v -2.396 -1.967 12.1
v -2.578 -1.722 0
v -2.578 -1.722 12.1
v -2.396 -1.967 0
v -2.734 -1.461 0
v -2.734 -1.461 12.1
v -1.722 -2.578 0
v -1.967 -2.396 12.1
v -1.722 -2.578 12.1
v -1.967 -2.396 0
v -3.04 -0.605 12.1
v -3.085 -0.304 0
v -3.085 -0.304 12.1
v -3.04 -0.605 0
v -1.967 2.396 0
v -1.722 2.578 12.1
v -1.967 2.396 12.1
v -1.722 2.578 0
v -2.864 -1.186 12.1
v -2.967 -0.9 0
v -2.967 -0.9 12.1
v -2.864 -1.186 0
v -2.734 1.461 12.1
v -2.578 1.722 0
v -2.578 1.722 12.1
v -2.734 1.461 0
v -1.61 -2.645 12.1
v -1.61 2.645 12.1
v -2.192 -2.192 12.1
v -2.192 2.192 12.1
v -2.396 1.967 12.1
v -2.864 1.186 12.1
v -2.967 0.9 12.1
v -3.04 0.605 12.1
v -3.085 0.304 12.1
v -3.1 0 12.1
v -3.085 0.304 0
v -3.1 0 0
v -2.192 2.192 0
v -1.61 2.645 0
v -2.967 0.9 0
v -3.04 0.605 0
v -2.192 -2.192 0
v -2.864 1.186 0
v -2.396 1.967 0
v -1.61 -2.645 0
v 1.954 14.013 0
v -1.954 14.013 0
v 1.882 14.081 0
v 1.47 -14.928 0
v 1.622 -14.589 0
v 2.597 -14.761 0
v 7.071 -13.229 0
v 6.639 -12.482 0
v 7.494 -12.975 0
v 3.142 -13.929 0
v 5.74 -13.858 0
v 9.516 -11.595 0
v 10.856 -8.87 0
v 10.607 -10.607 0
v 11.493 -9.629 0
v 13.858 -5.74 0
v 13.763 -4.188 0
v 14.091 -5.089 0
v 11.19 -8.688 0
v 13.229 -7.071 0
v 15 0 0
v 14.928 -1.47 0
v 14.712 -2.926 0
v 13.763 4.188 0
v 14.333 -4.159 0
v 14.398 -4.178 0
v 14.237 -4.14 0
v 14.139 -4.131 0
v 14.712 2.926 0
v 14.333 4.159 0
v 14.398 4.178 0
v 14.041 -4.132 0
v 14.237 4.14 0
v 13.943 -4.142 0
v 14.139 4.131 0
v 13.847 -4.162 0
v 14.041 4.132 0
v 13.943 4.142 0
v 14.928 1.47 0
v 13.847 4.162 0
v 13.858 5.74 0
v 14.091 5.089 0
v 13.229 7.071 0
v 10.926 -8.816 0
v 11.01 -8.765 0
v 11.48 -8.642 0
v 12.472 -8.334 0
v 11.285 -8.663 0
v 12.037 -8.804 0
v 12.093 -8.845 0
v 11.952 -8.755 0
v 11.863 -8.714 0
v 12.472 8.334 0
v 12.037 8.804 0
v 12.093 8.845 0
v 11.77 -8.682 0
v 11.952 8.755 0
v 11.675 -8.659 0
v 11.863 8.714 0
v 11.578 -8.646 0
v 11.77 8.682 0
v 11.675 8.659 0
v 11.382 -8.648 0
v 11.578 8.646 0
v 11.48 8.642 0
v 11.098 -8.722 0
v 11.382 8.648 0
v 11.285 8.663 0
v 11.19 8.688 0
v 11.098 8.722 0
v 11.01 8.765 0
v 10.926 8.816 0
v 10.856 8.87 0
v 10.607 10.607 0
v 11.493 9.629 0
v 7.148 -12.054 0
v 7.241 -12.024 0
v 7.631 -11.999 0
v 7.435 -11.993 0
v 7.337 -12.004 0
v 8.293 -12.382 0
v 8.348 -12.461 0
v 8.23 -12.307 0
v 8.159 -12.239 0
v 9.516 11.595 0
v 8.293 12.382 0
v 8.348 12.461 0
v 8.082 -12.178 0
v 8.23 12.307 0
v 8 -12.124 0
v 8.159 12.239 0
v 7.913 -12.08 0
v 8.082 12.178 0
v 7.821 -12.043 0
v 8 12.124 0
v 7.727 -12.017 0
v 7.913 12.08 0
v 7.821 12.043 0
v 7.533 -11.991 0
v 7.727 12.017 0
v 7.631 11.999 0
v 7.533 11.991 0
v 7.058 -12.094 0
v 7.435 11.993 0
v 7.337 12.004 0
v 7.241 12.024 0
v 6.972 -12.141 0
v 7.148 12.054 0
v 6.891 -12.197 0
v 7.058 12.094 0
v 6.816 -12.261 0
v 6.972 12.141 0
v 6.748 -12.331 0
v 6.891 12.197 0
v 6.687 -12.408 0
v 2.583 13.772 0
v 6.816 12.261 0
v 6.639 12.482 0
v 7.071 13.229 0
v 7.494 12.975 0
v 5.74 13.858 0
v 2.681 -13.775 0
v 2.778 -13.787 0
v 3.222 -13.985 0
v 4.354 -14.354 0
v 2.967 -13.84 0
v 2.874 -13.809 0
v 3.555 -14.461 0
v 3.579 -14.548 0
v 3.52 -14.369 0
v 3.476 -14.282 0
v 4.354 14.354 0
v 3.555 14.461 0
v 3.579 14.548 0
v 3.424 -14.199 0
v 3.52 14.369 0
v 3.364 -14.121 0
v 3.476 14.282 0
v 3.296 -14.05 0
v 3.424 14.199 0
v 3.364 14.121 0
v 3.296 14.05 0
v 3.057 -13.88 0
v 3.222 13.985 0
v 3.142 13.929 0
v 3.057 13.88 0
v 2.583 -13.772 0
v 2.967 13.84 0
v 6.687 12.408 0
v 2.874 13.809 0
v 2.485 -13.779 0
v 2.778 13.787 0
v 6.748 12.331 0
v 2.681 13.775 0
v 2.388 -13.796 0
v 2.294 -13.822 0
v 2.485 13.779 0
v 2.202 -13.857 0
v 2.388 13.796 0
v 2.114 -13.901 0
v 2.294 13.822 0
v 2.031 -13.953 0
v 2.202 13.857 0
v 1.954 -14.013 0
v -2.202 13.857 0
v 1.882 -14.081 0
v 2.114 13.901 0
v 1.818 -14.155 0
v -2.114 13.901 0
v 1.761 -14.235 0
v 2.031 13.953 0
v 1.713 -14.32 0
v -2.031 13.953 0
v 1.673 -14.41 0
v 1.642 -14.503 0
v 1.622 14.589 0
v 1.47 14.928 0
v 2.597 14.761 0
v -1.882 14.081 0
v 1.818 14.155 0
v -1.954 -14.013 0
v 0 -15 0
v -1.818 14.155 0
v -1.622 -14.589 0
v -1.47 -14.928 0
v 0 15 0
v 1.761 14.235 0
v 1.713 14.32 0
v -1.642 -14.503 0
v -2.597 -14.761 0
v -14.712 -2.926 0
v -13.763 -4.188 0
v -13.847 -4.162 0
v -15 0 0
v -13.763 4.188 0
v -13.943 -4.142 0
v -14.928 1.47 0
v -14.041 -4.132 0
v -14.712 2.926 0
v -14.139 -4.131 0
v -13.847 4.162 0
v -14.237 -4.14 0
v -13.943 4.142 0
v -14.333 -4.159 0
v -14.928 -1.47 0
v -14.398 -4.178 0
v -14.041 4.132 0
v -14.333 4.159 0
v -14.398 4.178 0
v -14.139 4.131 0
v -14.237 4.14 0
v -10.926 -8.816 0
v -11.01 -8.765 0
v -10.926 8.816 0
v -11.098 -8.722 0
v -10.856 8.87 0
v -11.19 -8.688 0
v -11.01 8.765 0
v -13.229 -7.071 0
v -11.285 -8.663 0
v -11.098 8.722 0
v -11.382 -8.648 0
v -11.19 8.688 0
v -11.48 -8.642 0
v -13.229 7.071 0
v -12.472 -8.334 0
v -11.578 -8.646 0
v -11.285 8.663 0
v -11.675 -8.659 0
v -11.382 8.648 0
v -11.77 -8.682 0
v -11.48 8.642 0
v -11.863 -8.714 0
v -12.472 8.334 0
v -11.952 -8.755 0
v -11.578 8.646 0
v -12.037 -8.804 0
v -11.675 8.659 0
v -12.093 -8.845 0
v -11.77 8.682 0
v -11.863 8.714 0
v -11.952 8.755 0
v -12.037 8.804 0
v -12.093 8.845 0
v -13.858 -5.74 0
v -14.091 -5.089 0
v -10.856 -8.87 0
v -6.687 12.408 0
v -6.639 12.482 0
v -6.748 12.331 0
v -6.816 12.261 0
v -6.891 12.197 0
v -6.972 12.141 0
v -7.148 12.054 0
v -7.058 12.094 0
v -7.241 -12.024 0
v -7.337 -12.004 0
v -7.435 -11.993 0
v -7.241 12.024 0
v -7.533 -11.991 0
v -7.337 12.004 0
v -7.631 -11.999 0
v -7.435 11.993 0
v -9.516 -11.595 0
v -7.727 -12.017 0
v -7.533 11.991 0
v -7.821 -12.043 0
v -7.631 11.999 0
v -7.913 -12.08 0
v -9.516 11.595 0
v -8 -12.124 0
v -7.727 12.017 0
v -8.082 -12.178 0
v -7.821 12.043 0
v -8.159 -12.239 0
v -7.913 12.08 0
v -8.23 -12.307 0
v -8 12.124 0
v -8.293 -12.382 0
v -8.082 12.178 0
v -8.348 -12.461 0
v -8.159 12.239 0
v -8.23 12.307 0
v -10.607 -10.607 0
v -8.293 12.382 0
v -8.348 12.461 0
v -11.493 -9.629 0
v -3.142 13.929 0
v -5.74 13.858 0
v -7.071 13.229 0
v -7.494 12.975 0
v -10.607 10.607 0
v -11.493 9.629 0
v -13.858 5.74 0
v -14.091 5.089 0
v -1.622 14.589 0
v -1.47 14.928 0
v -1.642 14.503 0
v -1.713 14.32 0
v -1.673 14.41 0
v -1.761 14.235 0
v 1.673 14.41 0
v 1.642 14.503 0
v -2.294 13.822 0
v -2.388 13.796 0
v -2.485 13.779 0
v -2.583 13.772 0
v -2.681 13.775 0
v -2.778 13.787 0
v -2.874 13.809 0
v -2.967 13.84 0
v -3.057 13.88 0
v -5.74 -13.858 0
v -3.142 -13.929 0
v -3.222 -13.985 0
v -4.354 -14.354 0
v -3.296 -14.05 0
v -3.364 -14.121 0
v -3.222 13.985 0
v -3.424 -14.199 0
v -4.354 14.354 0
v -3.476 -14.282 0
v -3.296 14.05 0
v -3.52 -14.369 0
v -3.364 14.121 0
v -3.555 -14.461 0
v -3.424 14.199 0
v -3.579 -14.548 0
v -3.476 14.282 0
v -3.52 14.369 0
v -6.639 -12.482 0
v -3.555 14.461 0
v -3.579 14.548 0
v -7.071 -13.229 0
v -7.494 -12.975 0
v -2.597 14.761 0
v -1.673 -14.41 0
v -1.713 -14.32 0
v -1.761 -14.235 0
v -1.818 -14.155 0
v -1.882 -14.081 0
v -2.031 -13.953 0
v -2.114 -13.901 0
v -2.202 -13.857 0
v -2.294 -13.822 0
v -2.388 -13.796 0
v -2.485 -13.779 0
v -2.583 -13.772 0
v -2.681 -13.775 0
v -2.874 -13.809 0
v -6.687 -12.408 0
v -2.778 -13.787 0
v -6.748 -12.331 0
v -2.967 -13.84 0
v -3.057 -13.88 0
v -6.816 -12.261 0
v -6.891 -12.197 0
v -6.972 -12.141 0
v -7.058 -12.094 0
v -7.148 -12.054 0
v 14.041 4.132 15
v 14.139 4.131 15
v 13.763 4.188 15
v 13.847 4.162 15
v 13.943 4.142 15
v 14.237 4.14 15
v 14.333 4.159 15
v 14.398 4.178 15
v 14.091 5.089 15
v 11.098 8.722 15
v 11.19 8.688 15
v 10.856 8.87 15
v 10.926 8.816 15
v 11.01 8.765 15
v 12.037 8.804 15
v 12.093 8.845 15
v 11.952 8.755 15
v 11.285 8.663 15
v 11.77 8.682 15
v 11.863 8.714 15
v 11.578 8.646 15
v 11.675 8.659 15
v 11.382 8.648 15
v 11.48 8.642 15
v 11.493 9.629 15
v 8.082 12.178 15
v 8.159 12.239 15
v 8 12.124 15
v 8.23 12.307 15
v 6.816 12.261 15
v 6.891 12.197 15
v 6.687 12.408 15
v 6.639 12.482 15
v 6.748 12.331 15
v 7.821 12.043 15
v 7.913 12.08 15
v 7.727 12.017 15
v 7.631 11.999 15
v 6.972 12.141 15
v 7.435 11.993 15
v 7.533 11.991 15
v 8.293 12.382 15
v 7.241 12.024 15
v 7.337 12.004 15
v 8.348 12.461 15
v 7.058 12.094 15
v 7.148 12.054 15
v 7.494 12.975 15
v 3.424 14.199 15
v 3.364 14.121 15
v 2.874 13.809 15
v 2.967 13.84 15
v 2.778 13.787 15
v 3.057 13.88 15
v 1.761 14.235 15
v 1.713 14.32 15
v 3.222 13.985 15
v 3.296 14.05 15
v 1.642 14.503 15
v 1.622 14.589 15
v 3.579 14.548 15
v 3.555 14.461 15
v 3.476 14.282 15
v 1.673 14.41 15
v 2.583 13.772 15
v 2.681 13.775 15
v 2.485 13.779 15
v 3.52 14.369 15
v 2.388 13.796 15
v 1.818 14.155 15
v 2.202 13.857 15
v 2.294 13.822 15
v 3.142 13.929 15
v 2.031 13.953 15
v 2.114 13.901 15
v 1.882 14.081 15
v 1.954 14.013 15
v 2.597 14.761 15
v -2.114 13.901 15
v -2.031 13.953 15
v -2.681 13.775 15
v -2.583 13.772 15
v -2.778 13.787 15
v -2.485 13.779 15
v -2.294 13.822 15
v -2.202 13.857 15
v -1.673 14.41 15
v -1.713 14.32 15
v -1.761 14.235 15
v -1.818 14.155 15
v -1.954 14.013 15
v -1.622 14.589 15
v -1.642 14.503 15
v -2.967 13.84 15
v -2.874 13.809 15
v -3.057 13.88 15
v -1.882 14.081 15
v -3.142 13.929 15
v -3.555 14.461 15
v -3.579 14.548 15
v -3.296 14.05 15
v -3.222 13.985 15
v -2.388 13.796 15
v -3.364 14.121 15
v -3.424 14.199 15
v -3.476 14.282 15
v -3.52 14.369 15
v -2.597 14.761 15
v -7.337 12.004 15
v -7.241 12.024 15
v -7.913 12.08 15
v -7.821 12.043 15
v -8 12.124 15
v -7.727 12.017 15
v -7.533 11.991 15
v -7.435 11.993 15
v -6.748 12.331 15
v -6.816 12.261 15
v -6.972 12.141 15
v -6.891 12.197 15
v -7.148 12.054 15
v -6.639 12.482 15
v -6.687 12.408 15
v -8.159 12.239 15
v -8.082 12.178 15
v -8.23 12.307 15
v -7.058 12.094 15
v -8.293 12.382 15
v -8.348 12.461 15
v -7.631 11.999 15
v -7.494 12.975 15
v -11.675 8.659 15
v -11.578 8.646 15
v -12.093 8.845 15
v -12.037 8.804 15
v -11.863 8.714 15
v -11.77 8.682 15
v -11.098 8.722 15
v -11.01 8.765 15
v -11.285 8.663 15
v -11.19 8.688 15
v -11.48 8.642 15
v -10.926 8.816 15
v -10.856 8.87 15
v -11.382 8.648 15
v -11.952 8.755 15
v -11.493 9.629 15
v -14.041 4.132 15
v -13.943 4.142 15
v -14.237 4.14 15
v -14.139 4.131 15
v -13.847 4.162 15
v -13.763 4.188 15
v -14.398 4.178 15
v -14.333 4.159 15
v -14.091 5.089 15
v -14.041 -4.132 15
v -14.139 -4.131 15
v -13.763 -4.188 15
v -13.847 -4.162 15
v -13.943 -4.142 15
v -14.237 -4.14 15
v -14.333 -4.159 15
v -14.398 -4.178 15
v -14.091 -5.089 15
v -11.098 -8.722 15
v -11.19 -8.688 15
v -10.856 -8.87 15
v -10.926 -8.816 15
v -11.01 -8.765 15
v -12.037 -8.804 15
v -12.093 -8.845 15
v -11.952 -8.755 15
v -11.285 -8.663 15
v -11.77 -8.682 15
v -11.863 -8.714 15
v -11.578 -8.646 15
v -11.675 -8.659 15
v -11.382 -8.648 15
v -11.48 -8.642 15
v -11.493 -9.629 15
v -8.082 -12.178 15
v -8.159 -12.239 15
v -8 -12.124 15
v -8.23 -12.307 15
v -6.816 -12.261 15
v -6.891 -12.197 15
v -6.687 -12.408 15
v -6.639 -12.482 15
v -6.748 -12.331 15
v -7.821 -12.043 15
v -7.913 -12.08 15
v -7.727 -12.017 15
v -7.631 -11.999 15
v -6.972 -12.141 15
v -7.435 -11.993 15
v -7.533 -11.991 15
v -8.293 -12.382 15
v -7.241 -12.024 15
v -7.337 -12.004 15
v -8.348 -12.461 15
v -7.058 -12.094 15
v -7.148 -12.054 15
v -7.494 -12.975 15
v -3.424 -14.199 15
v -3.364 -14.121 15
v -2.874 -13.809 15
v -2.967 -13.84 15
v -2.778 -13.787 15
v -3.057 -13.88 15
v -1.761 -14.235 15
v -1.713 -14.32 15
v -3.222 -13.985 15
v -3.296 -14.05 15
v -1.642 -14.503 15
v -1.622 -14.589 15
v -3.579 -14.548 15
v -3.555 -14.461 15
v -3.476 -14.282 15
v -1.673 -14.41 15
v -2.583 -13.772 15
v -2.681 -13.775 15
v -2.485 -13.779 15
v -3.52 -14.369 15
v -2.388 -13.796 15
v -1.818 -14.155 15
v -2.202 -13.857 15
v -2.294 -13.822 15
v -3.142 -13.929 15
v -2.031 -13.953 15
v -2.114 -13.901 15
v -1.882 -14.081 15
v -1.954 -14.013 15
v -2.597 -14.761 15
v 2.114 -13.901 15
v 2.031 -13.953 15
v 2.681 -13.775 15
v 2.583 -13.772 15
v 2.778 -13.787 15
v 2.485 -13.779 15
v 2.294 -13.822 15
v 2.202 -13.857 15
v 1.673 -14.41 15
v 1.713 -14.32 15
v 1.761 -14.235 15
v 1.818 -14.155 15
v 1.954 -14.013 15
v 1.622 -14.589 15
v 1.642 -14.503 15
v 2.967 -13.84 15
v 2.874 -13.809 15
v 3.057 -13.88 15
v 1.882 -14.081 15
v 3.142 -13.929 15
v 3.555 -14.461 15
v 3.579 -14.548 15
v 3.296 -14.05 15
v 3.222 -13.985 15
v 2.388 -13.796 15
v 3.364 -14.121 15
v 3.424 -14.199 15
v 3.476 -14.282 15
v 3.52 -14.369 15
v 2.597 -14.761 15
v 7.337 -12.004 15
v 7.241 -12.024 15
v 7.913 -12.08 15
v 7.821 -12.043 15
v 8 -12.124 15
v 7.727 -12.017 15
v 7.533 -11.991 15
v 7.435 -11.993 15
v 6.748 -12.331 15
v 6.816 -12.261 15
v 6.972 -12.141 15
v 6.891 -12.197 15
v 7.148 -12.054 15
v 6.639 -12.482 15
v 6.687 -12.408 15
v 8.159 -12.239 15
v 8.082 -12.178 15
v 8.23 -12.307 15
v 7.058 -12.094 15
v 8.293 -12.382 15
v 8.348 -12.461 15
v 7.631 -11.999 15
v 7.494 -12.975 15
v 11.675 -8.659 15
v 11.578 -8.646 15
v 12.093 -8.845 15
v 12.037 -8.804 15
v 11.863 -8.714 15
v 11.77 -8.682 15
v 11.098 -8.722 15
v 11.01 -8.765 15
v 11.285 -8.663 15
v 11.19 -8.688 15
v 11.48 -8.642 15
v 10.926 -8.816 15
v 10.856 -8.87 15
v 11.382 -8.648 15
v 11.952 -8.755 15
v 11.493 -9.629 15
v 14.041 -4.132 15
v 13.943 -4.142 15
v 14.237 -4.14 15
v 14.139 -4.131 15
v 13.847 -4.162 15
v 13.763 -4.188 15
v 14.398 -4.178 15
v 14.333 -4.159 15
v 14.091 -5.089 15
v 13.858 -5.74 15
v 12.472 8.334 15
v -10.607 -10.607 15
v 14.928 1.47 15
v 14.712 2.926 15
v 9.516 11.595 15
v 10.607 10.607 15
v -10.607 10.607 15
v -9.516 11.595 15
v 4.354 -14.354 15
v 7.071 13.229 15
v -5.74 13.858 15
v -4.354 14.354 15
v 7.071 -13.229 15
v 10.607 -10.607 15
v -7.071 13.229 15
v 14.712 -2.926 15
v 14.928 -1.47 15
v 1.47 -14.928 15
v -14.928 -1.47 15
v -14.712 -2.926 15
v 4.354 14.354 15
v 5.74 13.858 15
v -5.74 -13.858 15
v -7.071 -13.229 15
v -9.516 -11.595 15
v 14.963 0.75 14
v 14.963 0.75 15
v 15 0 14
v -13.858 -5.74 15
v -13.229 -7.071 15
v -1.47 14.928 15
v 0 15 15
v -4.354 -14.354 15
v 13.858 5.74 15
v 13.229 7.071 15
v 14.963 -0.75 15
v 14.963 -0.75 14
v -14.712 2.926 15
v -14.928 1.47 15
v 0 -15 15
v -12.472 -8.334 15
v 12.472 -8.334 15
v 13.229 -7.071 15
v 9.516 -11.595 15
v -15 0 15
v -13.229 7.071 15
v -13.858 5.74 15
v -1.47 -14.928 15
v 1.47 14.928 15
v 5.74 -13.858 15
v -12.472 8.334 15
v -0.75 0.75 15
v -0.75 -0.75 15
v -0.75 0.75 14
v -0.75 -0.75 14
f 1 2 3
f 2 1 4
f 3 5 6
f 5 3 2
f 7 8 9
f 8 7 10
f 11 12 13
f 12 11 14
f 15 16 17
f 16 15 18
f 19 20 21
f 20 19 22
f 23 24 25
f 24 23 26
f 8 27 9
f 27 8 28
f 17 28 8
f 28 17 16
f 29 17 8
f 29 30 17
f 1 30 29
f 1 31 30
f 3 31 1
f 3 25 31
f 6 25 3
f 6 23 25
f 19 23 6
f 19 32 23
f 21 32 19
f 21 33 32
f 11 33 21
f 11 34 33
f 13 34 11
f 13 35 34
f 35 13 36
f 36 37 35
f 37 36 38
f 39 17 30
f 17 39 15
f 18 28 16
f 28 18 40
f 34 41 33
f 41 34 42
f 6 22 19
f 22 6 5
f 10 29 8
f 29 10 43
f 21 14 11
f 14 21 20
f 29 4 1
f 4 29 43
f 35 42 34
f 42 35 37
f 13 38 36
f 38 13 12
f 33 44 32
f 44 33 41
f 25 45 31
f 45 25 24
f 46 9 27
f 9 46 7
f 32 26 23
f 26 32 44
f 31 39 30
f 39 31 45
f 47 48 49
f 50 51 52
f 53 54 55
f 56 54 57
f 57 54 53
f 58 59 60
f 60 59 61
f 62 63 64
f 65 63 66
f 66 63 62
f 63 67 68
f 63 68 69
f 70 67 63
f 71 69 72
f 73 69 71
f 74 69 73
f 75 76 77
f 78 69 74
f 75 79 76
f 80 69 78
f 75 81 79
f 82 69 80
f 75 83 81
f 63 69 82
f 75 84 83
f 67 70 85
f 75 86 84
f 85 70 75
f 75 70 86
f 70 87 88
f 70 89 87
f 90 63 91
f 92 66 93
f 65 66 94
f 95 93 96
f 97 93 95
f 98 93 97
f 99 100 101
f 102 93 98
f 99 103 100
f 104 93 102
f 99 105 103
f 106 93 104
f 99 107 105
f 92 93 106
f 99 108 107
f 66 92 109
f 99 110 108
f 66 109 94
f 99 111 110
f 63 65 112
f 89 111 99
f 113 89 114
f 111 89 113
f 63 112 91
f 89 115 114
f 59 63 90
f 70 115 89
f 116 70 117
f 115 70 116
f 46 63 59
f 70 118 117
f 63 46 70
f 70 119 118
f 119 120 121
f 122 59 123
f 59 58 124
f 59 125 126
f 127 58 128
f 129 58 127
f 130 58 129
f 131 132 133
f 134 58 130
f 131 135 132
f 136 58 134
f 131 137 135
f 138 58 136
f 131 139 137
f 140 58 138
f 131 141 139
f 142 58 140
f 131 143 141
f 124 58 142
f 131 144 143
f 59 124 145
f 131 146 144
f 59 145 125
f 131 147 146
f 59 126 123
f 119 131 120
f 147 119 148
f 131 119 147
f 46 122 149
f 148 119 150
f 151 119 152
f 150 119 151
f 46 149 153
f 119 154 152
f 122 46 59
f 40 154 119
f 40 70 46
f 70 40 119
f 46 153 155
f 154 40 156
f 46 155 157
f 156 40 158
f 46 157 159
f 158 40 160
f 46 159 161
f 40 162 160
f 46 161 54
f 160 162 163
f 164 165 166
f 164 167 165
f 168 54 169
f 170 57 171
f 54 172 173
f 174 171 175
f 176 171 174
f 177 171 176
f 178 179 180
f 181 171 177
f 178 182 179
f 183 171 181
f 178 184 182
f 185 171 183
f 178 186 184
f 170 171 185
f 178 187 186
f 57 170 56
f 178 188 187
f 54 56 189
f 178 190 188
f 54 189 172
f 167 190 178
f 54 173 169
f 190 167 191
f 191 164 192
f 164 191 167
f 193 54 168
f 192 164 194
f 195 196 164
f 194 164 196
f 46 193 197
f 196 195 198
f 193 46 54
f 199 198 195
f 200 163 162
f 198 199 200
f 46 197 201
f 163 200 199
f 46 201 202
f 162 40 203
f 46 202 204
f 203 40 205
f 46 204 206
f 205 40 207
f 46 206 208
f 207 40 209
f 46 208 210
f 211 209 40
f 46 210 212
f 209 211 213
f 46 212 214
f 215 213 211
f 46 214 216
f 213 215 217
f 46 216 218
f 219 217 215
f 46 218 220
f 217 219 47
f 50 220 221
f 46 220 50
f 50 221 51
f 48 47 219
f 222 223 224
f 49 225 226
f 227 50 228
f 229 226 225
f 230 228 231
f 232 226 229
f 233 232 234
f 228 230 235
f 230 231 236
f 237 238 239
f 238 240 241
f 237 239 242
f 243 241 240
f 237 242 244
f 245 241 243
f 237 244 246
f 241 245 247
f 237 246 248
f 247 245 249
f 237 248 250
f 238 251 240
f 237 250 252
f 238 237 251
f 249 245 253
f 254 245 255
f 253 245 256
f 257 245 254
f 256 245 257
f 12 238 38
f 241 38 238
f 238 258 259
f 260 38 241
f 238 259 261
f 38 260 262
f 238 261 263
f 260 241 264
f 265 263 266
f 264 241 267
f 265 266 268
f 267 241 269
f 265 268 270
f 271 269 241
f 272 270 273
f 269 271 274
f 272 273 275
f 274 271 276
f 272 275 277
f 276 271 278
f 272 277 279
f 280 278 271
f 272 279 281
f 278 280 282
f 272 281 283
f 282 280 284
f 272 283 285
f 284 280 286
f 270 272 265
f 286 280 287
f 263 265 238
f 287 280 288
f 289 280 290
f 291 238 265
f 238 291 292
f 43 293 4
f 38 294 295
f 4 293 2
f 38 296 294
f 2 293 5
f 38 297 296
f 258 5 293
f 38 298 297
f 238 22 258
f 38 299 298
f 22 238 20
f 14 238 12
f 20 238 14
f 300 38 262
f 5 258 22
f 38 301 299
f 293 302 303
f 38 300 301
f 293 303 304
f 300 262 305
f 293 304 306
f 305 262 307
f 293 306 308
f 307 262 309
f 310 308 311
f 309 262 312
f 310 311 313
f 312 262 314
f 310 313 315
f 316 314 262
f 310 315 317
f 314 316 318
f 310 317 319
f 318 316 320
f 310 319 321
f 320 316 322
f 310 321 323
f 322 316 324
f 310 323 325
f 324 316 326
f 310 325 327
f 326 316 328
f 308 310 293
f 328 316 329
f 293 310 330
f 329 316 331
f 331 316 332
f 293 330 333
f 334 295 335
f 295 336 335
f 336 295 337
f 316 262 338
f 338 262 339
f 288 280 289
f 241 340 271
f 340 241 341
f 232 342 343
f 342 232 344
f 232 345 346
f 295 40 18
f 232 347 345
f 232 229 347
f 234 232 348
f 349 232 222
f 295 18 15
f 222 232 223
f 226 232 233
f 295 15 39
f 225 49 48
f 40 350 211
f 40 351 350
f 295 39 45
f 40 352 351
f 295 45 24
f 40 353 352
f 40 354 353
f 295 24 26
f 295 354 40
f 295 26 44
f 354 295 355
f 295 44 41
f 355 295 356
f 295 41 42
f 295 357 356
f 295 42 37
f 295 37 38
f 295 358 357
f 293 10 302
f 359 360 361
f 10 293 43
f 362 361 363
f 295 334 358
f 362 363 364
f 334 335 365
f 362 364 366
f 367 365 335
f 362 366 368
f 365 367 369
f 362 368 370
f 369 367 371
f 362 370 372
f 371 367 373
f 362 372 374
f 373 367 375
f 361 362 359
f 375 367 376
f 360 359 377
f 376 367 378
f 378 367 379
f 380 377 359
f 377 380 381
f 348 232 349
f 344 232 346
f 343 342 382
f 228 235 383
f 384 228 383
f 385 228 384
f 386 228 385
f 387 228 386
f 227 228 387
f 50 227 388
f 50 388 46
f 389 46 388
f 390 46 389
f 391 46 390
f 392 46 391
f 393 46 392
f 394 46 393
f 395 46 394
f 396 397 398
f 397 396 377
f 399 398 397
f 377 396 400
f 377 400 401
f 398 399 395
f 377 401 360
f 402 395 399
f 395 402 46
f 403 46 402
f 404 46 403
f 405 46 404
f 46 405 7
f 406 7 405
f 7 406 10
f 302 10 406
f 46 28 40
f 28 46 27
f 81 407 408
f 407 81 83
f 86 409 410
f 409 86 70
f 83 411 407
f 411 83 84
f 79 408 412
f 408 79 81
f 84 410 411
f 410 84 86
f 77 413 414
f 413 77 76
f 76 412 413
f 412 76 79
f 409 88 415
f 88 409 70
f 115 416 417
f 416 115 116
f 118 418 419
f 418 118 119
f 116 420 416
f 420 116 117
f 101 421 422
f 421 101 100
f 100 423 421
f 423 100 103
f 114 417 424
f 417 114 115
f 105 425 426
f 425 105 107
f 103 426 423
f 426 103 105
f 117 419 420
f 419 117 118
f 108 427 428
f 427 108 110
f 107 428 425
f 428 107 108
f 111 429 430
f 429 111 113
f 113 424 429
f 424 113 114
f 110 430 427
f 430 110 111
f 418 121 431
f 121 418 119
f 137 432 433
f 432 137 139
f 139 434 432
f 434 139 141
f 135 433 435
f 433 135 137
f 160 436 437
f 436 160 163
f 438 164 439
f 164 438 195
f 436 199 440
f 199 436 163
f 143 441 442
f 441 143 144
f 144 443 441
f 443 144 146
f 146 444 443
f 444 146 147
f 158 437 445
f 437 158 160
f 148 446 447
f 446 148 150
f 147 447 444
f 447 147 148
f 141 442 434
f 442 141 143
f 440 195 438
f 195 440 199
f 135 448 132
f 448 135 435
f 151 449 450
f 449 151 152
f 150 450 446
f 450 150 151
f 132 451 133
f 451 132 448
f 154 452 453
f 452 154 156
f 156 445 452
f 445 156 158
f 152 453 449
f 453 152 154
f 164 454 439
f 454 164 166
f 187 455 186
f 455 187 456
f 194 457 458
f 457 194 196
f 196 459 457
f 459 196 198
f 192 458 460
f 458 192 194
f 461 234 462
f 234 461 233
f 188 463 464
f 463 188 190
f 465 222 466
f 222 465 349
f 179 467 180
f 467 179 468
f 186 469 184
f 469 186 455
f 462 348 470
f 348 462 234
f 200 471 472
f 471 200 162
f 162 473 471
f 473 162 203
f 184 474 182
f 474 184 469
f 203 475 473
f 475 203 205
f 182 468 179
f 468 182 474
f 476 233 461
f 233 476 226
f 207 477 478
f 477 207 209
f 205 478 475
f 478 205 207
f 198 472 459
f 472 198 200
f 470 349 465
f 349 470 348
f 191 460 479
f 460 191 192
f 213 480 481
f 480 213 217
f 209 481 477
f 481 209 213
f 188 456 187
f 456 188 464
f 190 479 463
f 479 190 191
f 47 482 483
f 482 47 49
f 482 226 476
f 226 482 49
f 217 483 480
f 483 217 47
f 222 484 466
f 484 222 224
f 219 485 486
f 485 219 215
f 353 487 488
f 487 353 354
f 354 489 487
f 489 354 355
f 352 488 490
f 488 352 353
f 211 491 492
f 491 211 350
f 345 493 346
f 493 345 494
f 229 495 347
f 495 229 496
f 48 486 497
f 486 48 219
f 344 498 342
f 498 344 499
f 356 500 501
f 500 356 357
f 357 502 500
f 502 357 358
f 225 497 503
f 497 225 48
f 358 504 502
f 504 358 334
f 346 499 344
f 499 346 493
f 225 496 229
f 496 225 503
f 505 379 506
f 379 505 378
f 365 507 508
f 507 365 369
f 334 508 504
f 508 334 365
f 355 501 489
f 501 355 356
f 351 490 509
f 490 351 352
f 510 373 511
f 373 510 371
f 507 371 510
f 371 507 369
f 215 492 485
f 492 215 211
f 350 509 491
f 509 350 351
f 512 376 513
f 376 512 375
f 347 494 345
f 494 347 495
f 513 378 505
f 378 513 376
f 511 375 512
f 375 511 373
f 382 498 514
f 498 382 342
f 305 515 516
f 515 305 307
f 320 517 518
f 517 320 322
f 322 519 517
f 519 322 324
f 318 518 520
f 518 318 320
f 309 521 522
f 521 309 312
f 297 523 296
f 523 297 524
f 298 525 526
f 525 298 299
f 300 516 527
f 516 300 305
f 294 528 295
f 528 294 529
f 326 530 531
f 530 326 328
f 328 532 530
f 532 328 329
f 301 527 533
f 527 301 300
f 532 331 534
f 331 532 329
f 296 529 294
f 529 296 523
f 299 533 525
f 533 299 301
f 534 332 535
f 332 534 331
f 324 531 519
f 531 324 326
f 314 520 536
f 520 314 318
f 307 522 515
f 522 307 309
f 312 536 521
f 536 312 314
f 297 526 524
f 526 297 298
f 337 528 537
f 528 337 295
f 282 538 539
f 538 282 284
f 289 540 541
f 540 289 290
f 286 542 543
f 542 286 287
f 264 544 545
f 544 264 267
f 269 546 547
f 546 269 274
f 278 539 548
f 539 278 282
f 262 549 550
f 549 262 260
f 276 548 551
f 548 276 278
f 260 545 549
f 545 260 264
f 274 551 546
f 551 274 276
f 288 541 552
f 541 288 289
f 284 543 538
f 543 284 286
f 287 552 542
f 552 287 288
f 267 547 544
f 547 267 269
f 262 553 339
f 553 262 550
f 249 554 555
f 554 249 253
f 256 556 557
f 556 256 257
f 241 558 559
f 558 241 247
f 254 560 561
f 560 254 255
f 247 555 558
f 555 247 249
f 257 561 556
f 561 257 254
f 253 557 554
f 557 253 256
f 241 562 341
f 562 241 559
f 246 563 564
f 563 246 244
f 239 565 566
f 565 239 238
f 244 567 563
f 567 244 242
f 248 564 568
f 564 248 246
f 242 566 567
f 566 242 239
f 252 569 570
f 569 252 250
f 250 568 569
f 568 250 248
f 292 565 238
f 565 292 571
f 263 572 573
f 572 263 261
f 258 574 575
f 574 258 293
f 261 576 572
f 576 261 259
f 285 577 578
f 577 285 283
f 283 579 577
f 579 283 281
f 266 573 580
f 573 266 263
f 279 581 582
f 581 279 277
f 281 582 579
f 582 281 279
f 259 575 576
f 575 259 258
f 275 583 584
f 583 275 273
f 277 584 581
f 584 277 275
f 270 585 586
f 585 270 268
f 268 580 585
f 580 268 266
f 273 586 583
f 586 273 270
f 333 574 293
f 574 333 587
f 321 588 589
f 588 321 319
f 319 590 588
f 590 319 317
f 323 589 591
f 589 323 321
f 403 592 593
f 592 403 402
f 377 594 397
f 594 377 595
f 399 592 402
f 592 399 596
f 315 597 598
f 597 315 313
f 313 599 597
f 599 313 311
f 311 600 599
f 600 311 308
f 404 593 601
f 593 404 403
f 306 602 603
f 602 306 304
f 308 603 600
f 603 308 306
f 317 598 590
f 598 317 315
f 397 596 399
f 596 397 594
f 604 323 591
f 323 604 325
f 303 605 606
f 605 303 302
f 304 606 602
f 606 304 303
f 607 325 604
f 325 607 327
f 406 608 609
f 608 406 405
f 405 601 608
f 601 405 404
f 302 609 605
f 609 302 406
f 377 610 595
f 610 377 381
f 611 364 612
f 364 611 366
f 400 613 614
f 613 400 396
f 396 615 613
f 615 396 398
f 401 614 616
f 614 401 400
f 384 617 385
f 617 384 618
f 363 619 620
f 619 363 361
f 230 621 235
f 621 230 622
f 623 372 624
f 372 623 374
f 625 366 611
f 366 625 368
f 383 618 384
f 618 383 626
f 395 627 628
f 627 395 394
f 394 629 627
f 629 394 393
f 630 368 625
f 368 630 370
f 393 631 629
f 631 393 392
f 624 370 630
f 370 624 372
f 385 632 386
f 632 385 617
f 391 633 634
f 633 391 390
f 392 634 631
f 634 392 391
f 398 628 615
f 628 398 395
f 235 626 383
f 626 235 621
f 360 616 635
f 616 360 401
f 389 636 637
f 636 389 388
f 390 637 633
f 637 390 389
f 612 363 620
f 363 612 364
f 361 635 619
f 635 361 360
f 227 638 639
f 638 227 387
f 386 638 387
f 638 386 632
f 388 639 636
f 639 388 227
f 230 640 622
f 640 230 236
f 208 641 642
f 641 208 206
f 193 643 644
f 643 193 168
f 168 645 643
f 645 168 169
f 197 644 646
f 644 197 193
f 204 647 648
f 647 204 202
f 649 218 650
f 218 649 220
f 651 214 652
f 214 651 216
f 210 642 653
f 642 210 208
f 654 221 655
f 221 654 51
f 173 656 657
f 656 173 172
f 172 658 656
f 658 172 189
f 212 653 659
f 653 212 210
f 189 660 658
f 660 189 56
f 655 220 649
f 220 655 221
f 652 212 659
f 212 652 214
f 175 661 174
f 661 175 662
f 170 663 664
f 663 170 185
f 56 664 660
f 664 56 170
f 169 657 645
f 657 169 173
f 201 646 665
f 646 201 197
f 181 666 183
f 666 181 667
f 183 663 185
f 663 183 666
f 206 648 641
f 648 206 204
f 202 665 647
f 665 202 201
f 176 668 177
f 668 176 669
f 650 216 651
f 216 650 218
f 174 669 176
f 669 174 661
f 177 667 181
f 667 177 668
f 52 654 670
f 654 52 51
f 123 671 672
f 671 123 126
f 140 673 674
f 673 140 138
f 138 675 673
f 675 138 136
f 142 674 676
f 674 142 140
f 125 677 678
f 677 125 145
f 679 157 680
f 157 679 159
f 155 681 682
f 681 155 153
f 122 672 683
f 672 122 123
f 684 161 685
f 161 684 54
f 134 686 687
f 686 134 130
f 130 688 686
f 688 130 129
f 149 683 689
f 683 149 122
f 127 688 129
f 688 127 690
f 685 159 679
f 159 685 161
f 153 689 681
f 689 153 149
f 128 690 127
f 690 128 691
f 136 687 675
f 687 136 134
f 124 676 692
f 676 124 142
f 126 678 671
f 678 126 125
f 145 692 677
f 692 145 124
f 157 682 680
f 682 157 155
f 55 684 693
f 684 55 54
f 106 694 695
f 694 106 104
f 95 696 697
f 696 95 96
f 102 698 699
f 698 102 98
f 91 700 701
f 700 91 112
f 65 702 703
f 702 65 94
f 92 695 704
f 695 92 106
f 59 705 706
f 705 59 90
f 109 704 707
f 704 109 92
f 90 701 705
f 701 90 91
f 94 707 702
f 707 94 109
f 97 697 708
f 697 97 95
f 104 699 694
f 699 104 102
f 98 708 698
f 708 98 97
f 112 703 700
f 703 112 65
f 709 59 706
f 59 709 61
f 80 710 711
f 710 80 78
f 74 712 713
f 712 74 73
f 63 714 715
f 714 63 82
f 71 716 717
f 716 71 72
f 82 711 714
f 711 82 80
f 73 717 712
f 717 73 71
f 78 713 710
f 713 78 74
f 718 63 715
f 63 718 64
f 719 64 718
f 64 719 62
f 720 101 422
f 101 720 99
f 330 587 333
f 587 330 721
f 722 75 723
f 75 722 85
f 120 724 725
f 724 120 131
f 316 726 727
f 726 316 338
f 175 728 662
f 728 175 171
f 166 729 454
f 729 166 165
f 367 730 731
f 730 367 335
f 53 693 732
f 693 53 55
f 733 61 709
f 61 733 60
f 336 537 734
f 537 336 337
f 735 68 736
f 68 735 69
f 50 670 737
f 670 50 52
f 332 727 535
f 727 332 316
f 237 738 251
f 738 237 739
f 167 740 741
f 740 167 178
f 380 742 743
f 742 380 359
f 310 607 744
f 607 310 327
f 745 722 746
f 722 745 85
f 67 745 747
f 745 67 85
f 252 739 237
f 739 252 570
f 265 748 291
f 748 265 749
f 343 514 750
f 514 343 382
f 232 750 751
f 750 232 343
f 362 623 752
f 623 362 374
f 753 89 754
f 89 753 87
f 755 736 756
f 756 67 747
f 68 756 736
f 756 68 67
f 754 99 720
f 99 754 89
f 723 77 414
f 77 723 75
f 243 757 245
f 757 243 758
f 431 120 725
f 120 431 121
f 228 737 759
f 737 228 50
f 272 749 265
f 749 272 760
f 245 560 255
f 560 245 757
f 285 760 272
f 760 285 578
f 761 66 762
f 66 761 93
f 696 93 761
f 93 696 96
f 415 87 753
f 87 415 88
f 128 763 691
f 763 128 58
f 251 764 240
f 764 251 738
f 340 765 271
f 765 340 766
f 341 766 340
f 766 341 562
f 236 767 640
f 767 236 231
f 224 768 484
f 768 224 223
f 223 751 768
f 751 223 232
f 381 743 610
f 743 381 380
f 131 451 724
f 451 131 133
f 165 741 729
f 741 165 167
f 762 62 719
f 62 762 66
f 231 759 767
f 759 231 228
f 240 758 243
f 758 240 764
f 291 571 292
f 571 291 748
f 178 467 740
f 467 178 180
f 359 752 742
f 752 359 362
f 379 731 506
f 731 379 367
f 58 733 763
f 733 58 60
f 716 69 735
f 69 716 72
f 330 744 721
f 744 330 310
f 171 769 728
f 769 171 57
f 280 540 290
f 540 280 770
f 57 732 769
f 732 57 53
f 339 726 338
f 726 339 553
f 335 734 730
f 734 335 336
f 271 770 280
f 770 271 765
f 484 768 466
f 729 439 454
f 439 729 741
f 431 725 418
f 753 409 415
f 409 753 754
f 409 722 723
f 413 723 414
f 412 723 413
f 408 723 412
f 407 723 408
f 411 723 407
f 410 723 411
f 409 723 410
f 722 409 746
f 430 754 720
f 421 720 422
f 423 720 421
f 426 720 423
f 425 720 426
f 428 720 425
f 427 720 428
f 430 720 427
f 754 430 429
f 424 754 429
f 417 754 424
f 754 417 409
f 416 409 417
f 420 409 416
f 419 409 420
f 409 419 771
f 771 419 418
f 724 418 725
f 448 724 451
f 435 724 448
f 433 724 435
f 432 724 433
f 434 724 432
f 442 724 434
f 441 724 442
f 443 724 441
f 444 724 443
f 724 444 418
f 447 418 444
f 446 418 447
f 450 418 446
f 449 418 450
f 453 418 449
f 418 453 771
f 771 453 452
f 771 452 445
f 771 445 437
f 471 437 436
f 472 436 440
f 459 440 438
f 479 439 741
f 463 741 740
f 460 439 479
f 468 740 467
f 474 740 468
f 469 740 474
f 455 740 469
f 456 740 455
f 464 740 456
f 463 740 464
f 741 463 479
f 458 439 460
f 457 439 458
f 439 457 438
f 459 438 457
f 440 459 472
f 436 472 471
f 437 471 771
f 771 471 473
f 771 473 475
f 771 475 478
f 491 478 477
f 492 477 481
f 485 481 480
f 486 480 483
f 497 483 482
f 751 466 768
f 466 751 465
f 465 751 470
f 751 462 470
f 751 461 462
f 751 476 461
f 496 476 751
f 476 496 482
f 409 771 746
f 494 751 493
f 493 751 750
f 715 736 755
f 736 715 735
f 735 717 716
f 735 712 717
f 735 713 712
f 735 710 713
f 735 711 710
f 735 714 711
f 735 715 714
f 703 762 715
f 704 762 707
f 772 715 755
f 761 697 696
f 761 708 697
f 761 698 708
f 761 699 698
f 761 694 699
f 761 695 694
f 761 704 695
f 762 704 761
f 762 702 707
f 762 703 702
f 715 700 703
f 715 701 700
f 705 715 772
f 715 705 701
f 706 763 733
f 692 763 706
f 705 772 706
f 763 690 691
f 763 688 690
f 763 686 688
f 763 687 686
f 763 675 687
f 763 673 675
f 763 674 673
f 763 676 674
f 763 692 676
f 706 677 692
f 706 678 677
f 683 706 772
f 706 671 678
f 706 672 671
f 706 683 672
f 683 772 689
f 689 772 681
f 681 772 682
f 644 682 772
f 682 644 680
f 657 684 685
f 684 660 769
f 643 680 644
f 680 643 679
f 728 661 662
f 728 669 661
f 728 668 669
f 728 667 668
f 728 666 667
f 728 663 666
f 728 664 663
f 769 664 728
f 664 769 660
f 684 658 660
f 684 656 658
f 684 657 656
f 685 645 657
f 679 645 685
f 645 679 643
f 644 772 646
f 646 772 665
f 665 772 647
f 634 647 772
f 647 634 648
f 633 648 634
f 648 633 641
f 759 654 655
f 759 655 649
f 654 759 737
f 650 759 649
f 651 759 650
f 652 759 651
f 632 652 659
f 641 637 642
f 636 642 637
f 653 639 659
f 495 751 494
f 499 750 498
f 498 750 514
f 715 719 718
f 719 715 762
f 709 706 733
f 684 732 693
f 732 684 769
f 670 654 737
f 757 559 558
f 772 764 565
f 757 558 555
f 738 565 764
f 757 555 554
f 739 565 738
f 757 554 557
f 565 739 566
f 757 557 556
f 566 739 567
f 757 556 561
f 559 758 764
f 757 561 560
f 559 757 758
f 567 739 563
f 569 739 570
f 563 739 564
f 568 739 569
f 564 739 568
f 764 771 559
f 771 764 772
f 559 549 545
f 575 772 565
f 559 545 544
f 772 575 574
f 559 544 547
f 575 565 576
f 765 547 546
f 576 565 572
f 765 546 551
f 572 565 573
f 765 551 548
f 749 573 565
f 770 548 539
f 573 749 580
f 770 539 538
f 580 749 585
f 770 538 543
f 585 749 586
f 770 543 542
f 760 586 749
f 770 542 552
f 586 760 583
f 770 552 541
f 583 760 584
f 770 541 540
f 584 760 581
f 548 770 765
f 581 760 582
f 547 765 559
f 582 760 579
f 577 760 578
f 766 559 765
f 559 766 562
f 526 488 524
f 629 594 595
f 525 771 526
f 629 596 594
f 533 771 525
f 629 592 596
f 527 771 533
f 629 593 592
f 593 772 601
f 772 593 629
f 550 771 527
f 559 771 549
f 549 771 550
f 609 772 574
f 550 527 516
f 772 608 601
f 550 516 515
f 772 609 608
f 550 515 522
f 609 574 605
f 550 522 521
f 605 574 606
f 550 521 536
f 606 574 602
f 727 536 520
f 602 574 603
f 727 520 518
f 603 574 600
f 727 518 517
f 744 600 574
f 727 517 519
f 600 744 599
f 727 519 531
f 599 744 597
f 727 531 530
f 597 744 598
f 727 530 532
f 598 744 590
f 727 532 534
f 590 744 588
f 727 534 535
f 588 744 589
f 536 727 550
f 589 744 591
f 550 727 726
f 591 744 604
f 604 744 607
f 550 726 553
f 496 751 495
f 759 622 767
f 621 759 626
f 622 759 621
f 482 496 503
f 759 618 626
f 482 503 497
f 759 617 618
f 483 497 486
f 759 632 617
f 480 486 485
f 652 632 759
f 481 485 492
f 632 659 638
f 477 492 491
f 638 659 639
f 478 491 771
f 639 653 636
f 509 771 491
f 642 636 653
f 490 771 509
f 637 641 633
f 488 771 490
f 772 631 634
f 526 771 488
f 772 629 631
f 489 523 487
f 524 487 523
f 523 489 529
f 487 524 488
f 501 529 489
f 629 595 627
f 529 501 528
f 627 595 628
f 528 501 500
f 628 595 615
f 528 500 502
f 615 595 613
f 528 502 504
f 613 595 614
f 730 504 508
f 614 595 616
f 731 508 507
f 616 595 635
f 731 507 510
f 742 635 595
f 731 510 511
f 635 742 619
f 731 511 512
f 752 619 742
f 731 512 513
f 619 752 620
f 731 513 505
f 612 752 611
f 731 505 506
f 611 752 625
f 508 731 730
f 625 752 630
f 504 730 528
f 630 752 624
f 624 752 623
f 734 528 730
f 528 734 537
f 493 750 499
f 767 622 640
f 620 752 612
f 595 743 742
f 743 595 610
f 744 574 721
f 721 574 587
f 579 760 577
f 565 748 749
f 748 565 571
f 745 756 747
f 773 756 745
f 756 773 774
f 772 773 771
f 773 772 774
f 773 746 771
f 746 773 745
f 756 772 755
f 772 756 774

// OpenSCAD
// Replacement knob for hotplate stirrer with 6 mm D-shaft
// Dimensions measured with calipers

// Knob body dimensions
knob_diameter = 30;
knob_radius = knob_diameter / 2;
knob_height = 15;

// D-shaft blind bore dimensions
bore_diameter = 6.2;
bore_radius = bore_diameter / 2;
bore_depth = 12;
// Distance from flat to opposite side of circle is 4.7 mm
// This means the flat is offset from center by: bore_radius - 4.7 = 3.1 - 4.7 = -1.6 mm
// So the flat is 1.6 mm on the opposite side of center from the "point" of the D
d_flat_offset = bore_radius - 4.7; // = -1.6 mm

// Grip groove dimensions
num_grooves = 18;
groove_diameter = 2;
groove_radius = groove_diameter / 2;

// Pointer groove dimensions
pointer_width = 1.5;
pointer_depth = 1;

// Print quality
$fn = 64;

// Main knob body
difference() {
    // Solid cylinder
    cylinder(h = knob_height, r = knob_radius, center = false);
    
    // D-shaped blind bore (centered on Z axis, extending from z=0 up to bore_depth)
    // The D-shape: a circle with one side cut flat
    // The flat is at distance d_flat_offset from center (negative means flat is on the -X side)
    // We create the D-shape by subtracting a half-space from a cylinder
    translate([0, 0, 0]) {
        difference() {
            // Cylindrical bore
            cylinder(h = bore_depth + 0.1, r = bore_radius, center = false);
            
            // Cut the flat side: remove material where x < d_flat_offset
            // This creates a flat surface at x = d_flat_offset
            // We use a large box that extends past the bore
            translate([d_flat_offset - 0.01, -knob_radius - 1, -0.1]) {
                cube([knob_radius + 1, 2 * knob_radius + 2, bore_depth + 0.3]);
            }
        }
    }
    
    // 18 evenly spaced vertical grip grooves along the outer surface
    for (i = [0 : num_grooves - 1]) {
        angle = i * 360 / num_grooves;
        // Position the groove center on the outer surface
        translate([knob_radius * cos(angle), knob_radius * sin(angle), 0]) {
            // Rotate so the half-cylinder faces inward
            rotate([0, 0, -angle]) {
                // Half-cylinder groove: cut into the knob from the outside
                // The groove is a half-cylinder of diameter 2 mm, centered on the surface
                // So it extends groove_radius inward and groove_radius outward (but outward is outside the knob)
                translate([0, 0, 0]) {
                    difference() {
                        cylinder(h = knob_height + 0.1, r = groove_radius, center = false);
                        // Remove the outer half (outside the knob) - not strictly necessary but clean
                        translate([-groove_radius - 0.01, -groove_radius - 0.01, -0.1]) {
                            cube([groove_radius + 0.02, 2 * groove_radius + 0.02, knob_height + 0.3]);
                        }
                    }
                }
            }
        }
    }
    
    // Pointer groove on top face: 1.5 mm wide, 1 mm deep, from center to outer edge
    // On the same side as the flat of the D (the flat is at x = d_flat_offset = -1.6 mm, so negative X side)
    // The groove runs from center (0,0) to outer edge in the -X direction
    // The previous code had a bug: it used a cube that was too wide in Y (knob_radius)
    // It should be a thin slot along X, centered on Y=0
    translate([-pointer_width/2, -pointer_width/2, knob_height - pointer_depth]) {
        cube([pointer_width, pointer_width, pointer_depth + 0.1]);
    }
    // Extend the groove to the edge
    translate([-pointer_width/2, -pointer_width/2, knob_height - pointer_depth]) {
        cube([knob_radius + pointer_width/2, pointer_width, pointer_depth + 0.1]);
    }
}
